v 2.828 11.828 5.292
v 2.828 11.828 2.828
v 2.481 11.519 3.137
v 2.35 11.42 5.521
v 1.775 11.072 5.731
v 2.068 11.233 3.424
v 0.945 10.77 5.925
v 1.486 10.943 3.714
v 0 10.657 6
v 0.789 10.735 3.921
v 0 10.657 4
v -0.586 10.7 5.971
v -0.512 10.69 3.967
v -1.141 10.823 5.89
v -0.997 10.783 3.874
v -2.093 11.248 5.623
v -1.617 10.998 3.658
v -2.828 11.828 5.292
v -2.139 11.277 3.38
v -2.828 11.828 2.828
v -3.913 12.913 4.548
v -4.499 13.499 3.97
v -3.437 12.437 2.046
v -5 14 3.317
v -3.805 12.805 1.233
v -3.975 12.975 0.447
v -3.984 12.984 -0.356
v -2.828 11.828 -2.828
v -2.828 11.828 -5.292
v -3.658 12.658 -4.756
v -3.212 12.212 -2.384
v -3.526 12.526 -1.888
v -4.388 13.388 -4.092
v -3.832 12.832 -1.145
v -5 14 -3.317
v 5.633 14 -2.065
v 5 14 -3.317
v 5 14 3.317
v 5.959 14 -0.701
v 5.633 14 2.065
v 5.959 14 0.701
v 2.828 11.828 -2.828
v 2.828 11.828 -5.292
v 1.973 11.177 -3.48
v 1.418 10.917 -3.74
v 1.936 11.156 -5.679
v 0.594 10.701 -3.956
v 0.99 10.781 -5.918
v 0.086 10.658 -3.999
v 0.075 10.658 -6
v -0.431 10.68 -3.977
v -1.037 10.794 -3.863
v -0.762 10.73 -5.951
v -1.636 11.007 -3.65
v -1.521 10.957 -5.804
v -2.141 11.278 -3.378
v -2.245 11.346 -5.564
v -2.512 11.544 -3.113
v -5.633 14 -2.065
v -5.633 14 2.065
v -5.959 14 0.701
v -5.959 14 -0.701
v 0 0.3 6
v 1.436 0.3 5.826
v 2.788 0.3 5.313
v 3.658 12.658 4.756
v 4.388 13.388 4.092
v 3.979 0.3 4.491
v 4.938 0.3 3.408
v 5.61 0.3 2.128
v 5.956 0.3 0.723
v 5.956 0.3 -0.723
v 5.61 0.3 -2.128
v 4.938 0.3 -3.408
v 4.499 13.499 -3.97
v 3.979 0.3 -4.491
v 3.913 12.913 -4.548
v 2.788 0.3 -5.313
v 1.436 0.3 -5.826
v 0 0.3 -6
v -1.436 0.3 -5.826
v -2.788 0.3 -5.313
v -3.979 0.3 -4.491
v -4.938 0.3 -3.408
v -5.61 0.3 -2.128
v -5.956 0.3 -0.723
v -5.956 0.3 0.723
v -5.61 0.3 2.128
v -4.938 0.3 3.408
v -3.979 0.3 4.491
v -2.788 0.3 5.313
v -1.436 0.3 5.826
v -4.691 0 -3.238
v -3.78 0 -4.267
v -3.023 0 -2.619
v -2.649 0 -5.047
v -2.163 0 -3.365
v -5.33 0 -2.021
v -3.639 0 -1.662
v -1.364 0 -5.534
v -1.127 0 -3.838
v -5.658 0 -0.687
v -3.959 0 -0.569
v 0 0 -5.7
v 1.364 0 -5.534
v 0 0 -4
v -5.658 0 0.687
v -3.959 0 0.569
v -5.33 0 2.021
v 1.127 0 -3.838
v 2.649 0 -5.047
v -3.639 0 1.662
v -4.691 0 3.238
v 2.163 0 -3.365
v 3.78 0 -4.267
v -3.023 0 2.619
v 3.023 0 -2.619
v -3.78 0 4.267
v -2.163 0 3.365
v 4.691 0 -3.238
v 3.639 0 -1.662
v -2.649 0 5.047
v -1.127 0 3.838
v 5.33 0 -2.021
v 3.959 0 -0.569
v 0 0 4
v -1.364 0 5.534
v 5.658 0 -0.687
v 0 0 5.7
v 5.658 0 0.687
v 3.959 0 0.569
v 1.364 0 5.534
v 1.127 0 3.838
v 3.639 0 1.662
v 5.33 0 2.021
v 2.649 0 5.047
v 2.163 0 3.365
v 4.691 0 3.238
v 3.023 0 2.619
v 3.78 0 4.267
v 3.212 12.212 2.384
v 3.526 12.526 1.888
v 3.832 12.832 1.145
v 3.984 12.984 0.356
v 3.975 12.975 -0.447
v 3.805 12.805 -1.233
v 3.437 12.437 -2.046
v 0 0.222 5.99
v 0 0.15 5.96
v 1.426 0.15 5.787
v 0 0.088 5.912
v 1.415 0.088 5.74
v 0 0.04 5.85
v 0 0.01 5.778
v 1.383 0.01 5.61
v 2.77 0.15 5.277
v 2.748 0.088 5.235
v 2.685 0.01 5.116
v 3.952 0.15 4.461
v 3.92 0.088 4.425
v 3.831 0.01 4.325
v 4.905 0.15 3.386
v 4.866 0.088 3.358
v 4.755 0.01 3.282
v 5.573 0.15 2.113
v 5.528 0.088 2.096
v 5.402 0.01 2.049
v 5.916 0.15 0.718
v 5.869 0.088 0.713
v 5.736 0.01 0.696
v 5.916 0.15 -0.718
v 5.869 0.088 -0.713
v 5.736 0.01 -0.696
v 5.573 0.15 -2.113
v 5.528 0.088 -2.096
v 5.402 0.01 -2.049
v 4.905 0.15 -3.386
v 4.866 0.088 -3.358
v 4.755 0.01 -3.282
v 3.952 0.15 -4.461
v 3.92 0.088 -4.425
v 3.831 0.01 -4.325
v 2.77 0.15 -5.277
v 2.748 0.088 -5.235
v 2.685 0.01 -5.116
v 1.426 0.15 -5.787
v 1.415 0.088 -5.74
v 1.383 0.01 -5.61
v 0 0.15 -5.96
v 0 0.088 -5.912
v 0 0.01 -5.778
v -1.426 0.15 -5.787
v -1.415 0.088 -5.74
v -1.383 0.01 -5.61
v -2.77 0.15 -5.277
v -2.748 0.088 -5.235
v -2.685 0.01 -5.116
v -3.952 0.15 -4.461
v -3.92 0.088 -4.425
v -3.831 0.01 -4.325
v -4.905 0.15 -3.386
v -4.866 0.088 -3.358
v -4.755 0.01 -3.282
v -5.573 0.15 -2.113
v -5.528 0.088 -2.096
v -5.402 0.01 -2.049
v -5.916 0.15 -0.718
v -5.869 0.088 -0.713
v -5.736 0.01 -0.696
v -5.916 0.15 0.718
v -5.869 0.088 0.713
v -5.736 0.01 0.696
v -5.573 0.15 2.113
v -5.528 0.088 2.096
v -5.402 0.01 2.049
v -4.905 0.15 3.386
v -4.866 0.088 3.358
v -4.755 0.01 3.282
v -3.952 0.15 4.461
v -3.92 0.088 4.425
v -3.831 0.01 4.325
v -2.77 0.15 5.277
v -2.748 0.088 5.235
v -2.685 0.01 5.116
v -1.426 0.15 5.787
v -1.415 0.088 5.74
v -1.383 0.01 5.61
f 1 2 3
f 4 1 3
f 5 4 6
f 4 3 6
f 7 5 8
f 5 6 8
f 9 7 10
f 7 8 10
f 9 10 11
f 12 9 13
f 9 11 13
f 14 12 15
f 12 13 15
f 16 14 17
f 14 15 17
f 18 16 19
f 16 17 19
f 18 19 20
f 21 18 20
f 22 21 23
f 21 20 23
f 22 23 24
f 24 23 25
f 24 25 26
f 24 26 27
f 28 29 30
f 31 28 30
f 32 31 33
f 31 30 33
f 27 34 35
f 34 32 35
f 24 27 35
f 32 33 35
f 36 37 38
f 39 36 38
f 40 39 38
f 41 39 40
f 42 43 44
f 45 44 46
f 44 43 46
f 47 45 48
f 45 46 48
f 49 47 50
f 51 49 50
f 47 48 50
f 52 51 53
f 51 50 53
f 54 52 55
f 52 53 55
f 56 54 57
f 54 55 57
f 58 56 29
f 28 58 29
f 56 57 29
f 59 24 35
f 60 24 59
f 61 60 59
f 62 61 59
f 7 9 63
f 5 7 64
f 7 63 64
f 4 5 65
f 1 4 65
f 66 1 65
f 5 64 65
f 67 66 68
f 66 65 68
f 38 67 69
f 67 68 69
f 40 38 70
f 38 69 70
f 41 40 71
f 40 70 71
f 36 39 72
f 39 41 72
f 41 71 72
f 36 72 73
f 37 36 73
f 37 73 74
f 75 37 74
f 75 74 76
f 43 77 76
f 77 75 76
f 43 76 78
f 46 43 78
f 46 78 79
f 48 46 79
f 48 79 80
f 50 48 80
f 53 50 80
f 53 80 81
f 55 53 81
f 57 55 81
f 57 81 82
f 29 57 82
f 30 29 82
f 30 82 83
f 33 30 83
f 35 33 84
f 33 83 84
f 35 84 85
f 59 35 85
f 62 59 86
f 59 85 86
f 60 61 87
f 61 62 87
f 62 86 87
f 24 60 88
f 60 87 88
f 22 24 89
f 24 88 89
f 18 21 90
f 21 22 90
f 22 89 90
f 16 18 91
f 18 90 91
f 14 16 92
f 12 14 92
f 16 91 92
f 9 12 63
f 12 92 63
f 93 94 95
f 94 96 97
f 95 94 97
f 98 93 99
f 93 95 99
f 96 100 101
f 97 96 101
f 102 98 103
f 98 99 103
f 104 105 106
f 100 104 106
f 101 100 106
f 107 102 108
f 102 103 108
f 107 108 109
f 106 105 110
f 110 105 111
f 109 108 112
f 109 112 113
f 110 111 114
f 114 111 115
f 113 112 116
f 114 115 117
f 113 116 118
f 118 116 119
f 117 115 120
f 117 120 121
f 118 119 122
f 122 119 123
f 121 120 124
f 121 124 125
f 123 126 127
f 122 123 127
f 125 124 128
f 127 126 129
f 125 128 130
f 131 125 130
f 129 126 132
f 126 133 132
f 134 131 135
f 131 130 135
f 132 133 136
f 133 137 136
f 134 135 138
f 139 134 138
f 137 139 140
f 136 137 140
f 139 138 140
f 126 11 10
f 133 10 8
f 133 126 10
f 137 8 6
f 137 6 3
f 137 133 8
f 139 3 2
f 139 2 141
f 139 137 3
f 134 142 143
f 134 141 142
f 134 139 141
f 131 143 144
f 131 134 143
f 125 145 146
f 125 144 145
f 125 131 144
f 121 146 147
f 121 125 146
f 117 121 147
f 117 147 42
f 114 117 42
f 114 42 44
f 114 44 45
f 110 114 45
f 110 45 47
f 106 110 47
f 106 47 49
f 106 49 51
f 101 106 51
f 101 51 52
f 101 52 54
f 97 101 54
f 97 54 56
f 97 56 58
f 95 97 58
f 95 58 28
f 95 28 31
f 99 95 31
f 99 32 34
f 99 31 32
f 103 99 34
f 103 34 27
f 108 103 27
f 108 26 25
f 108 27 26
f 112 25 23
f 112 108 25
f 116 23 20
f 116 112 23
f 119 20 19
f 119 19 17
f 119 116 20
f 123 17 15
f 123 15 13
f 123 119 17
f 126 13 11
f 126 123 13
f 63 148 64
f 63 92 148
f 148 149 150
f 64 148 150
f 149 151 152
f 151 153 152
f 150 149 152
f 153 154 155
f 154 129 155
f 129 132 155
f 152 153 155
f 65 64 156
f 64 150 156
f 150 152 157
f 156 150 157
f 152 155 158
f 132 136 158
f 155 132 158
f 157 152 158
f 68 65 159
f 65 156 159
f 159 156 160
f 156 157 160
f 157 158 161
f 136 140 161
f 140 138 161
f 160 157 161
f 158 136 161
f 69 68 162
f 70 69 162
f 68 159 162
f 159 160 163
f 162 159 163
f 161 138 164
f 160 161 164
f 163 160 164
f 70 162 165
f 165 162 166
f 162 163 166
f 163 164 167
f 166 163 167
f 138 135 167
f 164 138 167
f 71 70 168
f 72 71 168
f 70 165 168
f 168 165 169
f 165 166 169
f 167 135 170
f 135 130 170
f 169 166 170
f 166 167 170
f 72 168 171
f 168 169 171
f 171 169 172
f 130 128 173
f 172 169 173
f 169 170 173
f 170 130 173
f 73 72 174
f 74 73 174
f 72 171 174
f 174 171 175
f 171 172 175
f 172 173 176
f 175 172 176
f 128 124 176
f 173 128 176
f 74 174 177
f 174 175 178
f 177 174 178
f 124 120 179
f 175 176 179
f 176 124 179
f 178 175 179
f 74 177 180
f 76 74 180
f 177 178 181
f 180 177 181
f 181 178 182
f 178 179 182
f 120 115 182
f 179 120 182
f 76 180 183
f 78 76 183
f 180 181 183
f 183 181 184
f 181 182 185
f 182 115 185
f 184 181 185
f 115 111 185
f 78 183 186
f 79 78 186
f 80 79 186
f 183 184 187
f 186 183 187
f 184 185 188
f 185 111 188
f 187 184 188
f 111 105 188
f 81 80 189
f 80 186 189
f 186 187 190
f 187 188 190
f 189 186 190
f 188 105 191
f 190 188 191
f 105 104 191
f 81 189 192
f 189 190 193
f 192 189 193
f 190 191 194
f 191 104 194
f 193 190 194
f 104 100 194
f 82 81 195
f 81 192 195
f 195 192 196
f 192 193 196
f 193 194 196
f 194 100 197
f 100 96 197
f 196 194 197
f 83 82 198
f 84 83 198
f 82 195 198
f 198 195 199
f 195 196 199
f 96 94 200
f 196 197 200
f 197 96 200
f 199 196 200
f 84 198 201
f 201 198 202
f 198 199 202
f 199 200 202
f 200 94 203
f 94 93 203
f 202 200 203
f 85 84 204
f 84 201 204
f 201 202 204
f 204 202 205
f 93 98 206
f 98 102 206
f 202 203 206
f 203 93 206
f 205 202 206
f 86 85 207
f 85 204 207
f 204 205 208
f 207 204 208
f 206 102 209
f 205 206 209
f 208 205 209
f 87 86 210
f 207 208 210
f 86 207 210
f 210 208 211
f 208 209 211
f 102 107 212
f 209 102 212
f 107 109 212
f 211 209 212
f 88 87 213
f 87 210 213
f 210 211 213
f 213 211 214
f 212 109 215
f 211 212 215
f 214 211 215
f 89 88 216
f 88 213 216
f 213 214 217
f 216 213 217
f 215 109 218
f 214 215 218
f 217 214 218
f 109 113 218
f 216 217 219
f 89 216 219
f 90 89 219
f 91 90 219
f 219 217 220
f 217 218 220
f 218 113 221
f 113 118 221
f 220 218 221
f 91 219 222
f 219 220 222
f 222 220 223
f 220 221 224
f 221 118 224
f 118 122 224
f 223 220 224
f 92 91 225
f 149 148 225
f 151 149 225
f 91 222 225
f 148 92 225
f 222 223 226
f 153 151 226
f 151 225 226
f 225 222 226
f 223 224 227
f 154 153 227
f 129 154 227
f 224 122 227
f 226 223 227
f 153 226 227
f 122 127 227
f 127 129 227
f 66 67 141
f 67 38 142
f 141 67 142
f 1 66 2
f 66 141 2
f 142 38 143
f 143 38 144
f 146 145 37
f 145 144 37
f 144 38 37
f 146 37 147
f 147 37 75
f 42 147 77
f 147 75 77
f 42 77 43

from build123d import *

# Parameters (mm, degrees)
SKETCH_1_R               = 6
SKETCH_1_R_2             = 4
EXTRUDE_1_DEPTH          = 15
CUT_EXTRUDE_1_DEPTH      = 18.23368794
CUT_EXTRUDE_1_DEPTH_BACK = 18.23368794
FILLET_1_R               = 0.3


with BuildPart() as part:
    # Эскиз1 → Бобышка-Вытянуть1 (new body)
    with BuildSketch(Plane(origin=(0, 0, 0), x_dir=(1, 0, 0), z_dir=(0, 1, 0))):
        with Locations(Location((0, 0, 0), (0, 0, 270))):
            Circle(SKETCH_1_R)
        with Locations(Location((0, 0, 0), (0, 0, 270))):
            Circle(SKETCH_1_R_2, mode=Mode.SUBTRACT)
    extrude(amount=EXTRUDE_1_DEPTH)

    # Эскиз2 → Вырез-Вытянуть1 (cut, two sides: drawn at the far end of the back side and taken through both)
    with BuildSketch(Plane.XY.offset(-CUT_EXTRUDE_1_DEPTH_BACK)):
        with BuildLine():
            Line((5, 14), (2.828427125, 11.828427125))
            ThreePointArc((2.828427125, 11.828427125), (0, 10.656854249), (-2.828427125, 11.828427125))
            Line((-2.828427125, 11.828427125), (-5, 14))
            Line((-5, 14), (-7.91663408, 14))
            Line((-7.91663408, 14), (-7.91663408, 18.742378879))
            Line((-7.91663408, 18.742378879), (8.078053183, 18.742378879))
            Line((8.078053183, 18.742378879), (8.078053183, 14))
            Line((8.078053183, 14), (5, 14))
        make_face()
    extrude(amount=CUT_EXTRUDE_1_DEPTH + CUT_EXTRUDE_1_DEPTH_BACK, mode=Mode.SUBTRACT)

    # Скругление1
    fillet_1_edges = [part.edges().sort_by_distance(p)[0] for p in [
        (0, 0, -6),
    ]]
    fillet(fillet_1_edges, radius=FILLET_1_R)


solid = part.part
